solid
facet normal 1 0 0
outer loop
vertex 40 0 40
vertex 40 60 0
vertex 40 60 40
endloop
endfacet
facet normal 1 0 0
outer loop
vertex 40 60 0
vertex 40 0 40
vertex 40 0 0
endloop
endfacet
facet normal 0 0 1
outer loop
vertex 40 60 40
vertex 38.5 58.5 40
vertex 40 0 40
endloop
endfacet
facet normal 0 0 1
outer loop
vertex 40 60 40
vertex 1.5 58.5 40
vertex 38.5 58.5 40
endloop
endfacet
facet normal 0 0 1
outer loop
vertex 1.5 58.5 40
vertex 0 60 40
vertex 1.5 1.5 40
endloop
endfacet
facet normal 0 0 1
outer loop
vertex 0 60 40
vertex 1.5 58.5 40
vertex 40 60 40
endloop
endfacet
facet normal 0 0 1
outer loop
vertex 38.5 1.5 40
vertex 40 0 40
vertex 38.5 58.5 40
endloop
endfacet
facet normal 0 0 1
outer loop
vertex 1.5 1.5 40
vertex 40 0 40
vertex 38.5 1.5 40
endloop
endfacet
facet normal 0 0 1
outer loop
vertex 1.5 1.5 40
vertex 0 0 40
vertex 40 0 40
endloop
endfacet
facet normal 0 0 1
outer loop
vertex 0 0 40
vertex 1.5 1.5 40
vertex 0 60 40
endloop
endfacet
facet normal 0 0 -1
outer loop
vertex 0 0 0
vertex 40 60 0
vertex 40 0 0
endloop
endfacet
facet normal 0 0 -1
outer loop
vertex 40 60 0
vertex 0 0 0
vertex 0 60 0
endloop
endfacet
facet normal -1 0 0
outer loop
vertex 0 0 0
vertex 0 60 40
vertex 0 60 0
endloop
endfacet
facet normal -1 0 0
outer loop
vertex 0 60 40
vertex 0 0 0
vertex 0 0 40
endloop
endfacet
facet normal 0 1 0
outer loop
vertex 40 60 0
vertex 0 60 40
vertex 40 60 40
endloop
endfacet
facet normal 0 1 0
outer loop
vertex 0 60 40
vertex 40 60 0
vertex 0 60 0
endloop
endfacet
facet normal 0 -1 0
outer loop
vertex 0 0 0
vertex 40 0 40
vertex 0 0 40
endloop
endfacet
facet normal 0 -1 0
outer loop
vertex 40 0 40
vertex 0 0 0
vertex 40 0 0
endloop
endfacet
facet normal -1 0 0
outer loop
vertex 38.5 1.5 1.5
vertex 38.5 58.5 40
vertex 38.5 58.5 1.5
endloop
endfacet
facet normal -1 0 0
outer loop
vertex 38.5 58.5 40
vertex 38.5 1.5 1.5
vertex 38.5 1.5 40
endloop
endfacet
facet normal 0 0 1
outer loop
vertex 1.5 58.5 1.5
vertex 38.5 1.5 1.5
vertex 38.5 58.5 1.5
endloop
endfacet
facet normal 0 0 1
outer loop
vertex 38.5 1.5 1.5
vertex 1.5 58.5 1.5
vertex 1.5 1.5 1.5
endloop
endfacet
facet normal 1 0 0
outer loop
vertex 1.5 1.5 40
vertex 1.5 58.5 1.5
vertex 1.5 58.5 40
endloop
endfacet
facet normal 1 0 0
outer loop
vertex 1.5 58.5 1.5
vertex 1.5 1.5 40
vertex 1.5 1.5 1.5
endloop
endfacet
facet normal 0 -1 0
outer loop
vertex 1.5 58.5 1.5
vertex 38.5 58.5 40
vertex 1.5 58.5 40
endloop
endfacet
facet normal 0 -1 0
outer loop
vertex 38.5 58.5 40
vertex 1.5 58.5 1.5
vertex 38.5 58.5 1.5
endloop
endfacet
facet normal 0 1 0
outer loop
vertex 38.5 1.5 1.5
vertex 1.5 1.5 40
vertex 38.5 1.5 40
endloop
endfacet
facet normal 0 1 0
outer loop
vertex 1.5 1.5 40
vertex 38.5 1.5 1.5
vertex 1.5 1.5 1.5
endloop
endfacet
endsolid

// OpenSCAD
$fn = 32;

// ----------------------------------------------------------------------
// Open box: 1.5 mm walls
// ----------------------------------------------------------------------

// --- parameters (mm) ---
box_l = 40;               // outer length, X
box_w = 60;               // outer width, Y
box_h = 40;               // outer height, Z
wall = 1.5;               // wall thickness
floor = 1.5;              // floor thickness

difference() {
  cube([box_l, box_w, box_h]);
  translate([wall, wall, floor])
    cube([box_l - 2 * wall, box_w - 2 * wall, box_h]);
}
